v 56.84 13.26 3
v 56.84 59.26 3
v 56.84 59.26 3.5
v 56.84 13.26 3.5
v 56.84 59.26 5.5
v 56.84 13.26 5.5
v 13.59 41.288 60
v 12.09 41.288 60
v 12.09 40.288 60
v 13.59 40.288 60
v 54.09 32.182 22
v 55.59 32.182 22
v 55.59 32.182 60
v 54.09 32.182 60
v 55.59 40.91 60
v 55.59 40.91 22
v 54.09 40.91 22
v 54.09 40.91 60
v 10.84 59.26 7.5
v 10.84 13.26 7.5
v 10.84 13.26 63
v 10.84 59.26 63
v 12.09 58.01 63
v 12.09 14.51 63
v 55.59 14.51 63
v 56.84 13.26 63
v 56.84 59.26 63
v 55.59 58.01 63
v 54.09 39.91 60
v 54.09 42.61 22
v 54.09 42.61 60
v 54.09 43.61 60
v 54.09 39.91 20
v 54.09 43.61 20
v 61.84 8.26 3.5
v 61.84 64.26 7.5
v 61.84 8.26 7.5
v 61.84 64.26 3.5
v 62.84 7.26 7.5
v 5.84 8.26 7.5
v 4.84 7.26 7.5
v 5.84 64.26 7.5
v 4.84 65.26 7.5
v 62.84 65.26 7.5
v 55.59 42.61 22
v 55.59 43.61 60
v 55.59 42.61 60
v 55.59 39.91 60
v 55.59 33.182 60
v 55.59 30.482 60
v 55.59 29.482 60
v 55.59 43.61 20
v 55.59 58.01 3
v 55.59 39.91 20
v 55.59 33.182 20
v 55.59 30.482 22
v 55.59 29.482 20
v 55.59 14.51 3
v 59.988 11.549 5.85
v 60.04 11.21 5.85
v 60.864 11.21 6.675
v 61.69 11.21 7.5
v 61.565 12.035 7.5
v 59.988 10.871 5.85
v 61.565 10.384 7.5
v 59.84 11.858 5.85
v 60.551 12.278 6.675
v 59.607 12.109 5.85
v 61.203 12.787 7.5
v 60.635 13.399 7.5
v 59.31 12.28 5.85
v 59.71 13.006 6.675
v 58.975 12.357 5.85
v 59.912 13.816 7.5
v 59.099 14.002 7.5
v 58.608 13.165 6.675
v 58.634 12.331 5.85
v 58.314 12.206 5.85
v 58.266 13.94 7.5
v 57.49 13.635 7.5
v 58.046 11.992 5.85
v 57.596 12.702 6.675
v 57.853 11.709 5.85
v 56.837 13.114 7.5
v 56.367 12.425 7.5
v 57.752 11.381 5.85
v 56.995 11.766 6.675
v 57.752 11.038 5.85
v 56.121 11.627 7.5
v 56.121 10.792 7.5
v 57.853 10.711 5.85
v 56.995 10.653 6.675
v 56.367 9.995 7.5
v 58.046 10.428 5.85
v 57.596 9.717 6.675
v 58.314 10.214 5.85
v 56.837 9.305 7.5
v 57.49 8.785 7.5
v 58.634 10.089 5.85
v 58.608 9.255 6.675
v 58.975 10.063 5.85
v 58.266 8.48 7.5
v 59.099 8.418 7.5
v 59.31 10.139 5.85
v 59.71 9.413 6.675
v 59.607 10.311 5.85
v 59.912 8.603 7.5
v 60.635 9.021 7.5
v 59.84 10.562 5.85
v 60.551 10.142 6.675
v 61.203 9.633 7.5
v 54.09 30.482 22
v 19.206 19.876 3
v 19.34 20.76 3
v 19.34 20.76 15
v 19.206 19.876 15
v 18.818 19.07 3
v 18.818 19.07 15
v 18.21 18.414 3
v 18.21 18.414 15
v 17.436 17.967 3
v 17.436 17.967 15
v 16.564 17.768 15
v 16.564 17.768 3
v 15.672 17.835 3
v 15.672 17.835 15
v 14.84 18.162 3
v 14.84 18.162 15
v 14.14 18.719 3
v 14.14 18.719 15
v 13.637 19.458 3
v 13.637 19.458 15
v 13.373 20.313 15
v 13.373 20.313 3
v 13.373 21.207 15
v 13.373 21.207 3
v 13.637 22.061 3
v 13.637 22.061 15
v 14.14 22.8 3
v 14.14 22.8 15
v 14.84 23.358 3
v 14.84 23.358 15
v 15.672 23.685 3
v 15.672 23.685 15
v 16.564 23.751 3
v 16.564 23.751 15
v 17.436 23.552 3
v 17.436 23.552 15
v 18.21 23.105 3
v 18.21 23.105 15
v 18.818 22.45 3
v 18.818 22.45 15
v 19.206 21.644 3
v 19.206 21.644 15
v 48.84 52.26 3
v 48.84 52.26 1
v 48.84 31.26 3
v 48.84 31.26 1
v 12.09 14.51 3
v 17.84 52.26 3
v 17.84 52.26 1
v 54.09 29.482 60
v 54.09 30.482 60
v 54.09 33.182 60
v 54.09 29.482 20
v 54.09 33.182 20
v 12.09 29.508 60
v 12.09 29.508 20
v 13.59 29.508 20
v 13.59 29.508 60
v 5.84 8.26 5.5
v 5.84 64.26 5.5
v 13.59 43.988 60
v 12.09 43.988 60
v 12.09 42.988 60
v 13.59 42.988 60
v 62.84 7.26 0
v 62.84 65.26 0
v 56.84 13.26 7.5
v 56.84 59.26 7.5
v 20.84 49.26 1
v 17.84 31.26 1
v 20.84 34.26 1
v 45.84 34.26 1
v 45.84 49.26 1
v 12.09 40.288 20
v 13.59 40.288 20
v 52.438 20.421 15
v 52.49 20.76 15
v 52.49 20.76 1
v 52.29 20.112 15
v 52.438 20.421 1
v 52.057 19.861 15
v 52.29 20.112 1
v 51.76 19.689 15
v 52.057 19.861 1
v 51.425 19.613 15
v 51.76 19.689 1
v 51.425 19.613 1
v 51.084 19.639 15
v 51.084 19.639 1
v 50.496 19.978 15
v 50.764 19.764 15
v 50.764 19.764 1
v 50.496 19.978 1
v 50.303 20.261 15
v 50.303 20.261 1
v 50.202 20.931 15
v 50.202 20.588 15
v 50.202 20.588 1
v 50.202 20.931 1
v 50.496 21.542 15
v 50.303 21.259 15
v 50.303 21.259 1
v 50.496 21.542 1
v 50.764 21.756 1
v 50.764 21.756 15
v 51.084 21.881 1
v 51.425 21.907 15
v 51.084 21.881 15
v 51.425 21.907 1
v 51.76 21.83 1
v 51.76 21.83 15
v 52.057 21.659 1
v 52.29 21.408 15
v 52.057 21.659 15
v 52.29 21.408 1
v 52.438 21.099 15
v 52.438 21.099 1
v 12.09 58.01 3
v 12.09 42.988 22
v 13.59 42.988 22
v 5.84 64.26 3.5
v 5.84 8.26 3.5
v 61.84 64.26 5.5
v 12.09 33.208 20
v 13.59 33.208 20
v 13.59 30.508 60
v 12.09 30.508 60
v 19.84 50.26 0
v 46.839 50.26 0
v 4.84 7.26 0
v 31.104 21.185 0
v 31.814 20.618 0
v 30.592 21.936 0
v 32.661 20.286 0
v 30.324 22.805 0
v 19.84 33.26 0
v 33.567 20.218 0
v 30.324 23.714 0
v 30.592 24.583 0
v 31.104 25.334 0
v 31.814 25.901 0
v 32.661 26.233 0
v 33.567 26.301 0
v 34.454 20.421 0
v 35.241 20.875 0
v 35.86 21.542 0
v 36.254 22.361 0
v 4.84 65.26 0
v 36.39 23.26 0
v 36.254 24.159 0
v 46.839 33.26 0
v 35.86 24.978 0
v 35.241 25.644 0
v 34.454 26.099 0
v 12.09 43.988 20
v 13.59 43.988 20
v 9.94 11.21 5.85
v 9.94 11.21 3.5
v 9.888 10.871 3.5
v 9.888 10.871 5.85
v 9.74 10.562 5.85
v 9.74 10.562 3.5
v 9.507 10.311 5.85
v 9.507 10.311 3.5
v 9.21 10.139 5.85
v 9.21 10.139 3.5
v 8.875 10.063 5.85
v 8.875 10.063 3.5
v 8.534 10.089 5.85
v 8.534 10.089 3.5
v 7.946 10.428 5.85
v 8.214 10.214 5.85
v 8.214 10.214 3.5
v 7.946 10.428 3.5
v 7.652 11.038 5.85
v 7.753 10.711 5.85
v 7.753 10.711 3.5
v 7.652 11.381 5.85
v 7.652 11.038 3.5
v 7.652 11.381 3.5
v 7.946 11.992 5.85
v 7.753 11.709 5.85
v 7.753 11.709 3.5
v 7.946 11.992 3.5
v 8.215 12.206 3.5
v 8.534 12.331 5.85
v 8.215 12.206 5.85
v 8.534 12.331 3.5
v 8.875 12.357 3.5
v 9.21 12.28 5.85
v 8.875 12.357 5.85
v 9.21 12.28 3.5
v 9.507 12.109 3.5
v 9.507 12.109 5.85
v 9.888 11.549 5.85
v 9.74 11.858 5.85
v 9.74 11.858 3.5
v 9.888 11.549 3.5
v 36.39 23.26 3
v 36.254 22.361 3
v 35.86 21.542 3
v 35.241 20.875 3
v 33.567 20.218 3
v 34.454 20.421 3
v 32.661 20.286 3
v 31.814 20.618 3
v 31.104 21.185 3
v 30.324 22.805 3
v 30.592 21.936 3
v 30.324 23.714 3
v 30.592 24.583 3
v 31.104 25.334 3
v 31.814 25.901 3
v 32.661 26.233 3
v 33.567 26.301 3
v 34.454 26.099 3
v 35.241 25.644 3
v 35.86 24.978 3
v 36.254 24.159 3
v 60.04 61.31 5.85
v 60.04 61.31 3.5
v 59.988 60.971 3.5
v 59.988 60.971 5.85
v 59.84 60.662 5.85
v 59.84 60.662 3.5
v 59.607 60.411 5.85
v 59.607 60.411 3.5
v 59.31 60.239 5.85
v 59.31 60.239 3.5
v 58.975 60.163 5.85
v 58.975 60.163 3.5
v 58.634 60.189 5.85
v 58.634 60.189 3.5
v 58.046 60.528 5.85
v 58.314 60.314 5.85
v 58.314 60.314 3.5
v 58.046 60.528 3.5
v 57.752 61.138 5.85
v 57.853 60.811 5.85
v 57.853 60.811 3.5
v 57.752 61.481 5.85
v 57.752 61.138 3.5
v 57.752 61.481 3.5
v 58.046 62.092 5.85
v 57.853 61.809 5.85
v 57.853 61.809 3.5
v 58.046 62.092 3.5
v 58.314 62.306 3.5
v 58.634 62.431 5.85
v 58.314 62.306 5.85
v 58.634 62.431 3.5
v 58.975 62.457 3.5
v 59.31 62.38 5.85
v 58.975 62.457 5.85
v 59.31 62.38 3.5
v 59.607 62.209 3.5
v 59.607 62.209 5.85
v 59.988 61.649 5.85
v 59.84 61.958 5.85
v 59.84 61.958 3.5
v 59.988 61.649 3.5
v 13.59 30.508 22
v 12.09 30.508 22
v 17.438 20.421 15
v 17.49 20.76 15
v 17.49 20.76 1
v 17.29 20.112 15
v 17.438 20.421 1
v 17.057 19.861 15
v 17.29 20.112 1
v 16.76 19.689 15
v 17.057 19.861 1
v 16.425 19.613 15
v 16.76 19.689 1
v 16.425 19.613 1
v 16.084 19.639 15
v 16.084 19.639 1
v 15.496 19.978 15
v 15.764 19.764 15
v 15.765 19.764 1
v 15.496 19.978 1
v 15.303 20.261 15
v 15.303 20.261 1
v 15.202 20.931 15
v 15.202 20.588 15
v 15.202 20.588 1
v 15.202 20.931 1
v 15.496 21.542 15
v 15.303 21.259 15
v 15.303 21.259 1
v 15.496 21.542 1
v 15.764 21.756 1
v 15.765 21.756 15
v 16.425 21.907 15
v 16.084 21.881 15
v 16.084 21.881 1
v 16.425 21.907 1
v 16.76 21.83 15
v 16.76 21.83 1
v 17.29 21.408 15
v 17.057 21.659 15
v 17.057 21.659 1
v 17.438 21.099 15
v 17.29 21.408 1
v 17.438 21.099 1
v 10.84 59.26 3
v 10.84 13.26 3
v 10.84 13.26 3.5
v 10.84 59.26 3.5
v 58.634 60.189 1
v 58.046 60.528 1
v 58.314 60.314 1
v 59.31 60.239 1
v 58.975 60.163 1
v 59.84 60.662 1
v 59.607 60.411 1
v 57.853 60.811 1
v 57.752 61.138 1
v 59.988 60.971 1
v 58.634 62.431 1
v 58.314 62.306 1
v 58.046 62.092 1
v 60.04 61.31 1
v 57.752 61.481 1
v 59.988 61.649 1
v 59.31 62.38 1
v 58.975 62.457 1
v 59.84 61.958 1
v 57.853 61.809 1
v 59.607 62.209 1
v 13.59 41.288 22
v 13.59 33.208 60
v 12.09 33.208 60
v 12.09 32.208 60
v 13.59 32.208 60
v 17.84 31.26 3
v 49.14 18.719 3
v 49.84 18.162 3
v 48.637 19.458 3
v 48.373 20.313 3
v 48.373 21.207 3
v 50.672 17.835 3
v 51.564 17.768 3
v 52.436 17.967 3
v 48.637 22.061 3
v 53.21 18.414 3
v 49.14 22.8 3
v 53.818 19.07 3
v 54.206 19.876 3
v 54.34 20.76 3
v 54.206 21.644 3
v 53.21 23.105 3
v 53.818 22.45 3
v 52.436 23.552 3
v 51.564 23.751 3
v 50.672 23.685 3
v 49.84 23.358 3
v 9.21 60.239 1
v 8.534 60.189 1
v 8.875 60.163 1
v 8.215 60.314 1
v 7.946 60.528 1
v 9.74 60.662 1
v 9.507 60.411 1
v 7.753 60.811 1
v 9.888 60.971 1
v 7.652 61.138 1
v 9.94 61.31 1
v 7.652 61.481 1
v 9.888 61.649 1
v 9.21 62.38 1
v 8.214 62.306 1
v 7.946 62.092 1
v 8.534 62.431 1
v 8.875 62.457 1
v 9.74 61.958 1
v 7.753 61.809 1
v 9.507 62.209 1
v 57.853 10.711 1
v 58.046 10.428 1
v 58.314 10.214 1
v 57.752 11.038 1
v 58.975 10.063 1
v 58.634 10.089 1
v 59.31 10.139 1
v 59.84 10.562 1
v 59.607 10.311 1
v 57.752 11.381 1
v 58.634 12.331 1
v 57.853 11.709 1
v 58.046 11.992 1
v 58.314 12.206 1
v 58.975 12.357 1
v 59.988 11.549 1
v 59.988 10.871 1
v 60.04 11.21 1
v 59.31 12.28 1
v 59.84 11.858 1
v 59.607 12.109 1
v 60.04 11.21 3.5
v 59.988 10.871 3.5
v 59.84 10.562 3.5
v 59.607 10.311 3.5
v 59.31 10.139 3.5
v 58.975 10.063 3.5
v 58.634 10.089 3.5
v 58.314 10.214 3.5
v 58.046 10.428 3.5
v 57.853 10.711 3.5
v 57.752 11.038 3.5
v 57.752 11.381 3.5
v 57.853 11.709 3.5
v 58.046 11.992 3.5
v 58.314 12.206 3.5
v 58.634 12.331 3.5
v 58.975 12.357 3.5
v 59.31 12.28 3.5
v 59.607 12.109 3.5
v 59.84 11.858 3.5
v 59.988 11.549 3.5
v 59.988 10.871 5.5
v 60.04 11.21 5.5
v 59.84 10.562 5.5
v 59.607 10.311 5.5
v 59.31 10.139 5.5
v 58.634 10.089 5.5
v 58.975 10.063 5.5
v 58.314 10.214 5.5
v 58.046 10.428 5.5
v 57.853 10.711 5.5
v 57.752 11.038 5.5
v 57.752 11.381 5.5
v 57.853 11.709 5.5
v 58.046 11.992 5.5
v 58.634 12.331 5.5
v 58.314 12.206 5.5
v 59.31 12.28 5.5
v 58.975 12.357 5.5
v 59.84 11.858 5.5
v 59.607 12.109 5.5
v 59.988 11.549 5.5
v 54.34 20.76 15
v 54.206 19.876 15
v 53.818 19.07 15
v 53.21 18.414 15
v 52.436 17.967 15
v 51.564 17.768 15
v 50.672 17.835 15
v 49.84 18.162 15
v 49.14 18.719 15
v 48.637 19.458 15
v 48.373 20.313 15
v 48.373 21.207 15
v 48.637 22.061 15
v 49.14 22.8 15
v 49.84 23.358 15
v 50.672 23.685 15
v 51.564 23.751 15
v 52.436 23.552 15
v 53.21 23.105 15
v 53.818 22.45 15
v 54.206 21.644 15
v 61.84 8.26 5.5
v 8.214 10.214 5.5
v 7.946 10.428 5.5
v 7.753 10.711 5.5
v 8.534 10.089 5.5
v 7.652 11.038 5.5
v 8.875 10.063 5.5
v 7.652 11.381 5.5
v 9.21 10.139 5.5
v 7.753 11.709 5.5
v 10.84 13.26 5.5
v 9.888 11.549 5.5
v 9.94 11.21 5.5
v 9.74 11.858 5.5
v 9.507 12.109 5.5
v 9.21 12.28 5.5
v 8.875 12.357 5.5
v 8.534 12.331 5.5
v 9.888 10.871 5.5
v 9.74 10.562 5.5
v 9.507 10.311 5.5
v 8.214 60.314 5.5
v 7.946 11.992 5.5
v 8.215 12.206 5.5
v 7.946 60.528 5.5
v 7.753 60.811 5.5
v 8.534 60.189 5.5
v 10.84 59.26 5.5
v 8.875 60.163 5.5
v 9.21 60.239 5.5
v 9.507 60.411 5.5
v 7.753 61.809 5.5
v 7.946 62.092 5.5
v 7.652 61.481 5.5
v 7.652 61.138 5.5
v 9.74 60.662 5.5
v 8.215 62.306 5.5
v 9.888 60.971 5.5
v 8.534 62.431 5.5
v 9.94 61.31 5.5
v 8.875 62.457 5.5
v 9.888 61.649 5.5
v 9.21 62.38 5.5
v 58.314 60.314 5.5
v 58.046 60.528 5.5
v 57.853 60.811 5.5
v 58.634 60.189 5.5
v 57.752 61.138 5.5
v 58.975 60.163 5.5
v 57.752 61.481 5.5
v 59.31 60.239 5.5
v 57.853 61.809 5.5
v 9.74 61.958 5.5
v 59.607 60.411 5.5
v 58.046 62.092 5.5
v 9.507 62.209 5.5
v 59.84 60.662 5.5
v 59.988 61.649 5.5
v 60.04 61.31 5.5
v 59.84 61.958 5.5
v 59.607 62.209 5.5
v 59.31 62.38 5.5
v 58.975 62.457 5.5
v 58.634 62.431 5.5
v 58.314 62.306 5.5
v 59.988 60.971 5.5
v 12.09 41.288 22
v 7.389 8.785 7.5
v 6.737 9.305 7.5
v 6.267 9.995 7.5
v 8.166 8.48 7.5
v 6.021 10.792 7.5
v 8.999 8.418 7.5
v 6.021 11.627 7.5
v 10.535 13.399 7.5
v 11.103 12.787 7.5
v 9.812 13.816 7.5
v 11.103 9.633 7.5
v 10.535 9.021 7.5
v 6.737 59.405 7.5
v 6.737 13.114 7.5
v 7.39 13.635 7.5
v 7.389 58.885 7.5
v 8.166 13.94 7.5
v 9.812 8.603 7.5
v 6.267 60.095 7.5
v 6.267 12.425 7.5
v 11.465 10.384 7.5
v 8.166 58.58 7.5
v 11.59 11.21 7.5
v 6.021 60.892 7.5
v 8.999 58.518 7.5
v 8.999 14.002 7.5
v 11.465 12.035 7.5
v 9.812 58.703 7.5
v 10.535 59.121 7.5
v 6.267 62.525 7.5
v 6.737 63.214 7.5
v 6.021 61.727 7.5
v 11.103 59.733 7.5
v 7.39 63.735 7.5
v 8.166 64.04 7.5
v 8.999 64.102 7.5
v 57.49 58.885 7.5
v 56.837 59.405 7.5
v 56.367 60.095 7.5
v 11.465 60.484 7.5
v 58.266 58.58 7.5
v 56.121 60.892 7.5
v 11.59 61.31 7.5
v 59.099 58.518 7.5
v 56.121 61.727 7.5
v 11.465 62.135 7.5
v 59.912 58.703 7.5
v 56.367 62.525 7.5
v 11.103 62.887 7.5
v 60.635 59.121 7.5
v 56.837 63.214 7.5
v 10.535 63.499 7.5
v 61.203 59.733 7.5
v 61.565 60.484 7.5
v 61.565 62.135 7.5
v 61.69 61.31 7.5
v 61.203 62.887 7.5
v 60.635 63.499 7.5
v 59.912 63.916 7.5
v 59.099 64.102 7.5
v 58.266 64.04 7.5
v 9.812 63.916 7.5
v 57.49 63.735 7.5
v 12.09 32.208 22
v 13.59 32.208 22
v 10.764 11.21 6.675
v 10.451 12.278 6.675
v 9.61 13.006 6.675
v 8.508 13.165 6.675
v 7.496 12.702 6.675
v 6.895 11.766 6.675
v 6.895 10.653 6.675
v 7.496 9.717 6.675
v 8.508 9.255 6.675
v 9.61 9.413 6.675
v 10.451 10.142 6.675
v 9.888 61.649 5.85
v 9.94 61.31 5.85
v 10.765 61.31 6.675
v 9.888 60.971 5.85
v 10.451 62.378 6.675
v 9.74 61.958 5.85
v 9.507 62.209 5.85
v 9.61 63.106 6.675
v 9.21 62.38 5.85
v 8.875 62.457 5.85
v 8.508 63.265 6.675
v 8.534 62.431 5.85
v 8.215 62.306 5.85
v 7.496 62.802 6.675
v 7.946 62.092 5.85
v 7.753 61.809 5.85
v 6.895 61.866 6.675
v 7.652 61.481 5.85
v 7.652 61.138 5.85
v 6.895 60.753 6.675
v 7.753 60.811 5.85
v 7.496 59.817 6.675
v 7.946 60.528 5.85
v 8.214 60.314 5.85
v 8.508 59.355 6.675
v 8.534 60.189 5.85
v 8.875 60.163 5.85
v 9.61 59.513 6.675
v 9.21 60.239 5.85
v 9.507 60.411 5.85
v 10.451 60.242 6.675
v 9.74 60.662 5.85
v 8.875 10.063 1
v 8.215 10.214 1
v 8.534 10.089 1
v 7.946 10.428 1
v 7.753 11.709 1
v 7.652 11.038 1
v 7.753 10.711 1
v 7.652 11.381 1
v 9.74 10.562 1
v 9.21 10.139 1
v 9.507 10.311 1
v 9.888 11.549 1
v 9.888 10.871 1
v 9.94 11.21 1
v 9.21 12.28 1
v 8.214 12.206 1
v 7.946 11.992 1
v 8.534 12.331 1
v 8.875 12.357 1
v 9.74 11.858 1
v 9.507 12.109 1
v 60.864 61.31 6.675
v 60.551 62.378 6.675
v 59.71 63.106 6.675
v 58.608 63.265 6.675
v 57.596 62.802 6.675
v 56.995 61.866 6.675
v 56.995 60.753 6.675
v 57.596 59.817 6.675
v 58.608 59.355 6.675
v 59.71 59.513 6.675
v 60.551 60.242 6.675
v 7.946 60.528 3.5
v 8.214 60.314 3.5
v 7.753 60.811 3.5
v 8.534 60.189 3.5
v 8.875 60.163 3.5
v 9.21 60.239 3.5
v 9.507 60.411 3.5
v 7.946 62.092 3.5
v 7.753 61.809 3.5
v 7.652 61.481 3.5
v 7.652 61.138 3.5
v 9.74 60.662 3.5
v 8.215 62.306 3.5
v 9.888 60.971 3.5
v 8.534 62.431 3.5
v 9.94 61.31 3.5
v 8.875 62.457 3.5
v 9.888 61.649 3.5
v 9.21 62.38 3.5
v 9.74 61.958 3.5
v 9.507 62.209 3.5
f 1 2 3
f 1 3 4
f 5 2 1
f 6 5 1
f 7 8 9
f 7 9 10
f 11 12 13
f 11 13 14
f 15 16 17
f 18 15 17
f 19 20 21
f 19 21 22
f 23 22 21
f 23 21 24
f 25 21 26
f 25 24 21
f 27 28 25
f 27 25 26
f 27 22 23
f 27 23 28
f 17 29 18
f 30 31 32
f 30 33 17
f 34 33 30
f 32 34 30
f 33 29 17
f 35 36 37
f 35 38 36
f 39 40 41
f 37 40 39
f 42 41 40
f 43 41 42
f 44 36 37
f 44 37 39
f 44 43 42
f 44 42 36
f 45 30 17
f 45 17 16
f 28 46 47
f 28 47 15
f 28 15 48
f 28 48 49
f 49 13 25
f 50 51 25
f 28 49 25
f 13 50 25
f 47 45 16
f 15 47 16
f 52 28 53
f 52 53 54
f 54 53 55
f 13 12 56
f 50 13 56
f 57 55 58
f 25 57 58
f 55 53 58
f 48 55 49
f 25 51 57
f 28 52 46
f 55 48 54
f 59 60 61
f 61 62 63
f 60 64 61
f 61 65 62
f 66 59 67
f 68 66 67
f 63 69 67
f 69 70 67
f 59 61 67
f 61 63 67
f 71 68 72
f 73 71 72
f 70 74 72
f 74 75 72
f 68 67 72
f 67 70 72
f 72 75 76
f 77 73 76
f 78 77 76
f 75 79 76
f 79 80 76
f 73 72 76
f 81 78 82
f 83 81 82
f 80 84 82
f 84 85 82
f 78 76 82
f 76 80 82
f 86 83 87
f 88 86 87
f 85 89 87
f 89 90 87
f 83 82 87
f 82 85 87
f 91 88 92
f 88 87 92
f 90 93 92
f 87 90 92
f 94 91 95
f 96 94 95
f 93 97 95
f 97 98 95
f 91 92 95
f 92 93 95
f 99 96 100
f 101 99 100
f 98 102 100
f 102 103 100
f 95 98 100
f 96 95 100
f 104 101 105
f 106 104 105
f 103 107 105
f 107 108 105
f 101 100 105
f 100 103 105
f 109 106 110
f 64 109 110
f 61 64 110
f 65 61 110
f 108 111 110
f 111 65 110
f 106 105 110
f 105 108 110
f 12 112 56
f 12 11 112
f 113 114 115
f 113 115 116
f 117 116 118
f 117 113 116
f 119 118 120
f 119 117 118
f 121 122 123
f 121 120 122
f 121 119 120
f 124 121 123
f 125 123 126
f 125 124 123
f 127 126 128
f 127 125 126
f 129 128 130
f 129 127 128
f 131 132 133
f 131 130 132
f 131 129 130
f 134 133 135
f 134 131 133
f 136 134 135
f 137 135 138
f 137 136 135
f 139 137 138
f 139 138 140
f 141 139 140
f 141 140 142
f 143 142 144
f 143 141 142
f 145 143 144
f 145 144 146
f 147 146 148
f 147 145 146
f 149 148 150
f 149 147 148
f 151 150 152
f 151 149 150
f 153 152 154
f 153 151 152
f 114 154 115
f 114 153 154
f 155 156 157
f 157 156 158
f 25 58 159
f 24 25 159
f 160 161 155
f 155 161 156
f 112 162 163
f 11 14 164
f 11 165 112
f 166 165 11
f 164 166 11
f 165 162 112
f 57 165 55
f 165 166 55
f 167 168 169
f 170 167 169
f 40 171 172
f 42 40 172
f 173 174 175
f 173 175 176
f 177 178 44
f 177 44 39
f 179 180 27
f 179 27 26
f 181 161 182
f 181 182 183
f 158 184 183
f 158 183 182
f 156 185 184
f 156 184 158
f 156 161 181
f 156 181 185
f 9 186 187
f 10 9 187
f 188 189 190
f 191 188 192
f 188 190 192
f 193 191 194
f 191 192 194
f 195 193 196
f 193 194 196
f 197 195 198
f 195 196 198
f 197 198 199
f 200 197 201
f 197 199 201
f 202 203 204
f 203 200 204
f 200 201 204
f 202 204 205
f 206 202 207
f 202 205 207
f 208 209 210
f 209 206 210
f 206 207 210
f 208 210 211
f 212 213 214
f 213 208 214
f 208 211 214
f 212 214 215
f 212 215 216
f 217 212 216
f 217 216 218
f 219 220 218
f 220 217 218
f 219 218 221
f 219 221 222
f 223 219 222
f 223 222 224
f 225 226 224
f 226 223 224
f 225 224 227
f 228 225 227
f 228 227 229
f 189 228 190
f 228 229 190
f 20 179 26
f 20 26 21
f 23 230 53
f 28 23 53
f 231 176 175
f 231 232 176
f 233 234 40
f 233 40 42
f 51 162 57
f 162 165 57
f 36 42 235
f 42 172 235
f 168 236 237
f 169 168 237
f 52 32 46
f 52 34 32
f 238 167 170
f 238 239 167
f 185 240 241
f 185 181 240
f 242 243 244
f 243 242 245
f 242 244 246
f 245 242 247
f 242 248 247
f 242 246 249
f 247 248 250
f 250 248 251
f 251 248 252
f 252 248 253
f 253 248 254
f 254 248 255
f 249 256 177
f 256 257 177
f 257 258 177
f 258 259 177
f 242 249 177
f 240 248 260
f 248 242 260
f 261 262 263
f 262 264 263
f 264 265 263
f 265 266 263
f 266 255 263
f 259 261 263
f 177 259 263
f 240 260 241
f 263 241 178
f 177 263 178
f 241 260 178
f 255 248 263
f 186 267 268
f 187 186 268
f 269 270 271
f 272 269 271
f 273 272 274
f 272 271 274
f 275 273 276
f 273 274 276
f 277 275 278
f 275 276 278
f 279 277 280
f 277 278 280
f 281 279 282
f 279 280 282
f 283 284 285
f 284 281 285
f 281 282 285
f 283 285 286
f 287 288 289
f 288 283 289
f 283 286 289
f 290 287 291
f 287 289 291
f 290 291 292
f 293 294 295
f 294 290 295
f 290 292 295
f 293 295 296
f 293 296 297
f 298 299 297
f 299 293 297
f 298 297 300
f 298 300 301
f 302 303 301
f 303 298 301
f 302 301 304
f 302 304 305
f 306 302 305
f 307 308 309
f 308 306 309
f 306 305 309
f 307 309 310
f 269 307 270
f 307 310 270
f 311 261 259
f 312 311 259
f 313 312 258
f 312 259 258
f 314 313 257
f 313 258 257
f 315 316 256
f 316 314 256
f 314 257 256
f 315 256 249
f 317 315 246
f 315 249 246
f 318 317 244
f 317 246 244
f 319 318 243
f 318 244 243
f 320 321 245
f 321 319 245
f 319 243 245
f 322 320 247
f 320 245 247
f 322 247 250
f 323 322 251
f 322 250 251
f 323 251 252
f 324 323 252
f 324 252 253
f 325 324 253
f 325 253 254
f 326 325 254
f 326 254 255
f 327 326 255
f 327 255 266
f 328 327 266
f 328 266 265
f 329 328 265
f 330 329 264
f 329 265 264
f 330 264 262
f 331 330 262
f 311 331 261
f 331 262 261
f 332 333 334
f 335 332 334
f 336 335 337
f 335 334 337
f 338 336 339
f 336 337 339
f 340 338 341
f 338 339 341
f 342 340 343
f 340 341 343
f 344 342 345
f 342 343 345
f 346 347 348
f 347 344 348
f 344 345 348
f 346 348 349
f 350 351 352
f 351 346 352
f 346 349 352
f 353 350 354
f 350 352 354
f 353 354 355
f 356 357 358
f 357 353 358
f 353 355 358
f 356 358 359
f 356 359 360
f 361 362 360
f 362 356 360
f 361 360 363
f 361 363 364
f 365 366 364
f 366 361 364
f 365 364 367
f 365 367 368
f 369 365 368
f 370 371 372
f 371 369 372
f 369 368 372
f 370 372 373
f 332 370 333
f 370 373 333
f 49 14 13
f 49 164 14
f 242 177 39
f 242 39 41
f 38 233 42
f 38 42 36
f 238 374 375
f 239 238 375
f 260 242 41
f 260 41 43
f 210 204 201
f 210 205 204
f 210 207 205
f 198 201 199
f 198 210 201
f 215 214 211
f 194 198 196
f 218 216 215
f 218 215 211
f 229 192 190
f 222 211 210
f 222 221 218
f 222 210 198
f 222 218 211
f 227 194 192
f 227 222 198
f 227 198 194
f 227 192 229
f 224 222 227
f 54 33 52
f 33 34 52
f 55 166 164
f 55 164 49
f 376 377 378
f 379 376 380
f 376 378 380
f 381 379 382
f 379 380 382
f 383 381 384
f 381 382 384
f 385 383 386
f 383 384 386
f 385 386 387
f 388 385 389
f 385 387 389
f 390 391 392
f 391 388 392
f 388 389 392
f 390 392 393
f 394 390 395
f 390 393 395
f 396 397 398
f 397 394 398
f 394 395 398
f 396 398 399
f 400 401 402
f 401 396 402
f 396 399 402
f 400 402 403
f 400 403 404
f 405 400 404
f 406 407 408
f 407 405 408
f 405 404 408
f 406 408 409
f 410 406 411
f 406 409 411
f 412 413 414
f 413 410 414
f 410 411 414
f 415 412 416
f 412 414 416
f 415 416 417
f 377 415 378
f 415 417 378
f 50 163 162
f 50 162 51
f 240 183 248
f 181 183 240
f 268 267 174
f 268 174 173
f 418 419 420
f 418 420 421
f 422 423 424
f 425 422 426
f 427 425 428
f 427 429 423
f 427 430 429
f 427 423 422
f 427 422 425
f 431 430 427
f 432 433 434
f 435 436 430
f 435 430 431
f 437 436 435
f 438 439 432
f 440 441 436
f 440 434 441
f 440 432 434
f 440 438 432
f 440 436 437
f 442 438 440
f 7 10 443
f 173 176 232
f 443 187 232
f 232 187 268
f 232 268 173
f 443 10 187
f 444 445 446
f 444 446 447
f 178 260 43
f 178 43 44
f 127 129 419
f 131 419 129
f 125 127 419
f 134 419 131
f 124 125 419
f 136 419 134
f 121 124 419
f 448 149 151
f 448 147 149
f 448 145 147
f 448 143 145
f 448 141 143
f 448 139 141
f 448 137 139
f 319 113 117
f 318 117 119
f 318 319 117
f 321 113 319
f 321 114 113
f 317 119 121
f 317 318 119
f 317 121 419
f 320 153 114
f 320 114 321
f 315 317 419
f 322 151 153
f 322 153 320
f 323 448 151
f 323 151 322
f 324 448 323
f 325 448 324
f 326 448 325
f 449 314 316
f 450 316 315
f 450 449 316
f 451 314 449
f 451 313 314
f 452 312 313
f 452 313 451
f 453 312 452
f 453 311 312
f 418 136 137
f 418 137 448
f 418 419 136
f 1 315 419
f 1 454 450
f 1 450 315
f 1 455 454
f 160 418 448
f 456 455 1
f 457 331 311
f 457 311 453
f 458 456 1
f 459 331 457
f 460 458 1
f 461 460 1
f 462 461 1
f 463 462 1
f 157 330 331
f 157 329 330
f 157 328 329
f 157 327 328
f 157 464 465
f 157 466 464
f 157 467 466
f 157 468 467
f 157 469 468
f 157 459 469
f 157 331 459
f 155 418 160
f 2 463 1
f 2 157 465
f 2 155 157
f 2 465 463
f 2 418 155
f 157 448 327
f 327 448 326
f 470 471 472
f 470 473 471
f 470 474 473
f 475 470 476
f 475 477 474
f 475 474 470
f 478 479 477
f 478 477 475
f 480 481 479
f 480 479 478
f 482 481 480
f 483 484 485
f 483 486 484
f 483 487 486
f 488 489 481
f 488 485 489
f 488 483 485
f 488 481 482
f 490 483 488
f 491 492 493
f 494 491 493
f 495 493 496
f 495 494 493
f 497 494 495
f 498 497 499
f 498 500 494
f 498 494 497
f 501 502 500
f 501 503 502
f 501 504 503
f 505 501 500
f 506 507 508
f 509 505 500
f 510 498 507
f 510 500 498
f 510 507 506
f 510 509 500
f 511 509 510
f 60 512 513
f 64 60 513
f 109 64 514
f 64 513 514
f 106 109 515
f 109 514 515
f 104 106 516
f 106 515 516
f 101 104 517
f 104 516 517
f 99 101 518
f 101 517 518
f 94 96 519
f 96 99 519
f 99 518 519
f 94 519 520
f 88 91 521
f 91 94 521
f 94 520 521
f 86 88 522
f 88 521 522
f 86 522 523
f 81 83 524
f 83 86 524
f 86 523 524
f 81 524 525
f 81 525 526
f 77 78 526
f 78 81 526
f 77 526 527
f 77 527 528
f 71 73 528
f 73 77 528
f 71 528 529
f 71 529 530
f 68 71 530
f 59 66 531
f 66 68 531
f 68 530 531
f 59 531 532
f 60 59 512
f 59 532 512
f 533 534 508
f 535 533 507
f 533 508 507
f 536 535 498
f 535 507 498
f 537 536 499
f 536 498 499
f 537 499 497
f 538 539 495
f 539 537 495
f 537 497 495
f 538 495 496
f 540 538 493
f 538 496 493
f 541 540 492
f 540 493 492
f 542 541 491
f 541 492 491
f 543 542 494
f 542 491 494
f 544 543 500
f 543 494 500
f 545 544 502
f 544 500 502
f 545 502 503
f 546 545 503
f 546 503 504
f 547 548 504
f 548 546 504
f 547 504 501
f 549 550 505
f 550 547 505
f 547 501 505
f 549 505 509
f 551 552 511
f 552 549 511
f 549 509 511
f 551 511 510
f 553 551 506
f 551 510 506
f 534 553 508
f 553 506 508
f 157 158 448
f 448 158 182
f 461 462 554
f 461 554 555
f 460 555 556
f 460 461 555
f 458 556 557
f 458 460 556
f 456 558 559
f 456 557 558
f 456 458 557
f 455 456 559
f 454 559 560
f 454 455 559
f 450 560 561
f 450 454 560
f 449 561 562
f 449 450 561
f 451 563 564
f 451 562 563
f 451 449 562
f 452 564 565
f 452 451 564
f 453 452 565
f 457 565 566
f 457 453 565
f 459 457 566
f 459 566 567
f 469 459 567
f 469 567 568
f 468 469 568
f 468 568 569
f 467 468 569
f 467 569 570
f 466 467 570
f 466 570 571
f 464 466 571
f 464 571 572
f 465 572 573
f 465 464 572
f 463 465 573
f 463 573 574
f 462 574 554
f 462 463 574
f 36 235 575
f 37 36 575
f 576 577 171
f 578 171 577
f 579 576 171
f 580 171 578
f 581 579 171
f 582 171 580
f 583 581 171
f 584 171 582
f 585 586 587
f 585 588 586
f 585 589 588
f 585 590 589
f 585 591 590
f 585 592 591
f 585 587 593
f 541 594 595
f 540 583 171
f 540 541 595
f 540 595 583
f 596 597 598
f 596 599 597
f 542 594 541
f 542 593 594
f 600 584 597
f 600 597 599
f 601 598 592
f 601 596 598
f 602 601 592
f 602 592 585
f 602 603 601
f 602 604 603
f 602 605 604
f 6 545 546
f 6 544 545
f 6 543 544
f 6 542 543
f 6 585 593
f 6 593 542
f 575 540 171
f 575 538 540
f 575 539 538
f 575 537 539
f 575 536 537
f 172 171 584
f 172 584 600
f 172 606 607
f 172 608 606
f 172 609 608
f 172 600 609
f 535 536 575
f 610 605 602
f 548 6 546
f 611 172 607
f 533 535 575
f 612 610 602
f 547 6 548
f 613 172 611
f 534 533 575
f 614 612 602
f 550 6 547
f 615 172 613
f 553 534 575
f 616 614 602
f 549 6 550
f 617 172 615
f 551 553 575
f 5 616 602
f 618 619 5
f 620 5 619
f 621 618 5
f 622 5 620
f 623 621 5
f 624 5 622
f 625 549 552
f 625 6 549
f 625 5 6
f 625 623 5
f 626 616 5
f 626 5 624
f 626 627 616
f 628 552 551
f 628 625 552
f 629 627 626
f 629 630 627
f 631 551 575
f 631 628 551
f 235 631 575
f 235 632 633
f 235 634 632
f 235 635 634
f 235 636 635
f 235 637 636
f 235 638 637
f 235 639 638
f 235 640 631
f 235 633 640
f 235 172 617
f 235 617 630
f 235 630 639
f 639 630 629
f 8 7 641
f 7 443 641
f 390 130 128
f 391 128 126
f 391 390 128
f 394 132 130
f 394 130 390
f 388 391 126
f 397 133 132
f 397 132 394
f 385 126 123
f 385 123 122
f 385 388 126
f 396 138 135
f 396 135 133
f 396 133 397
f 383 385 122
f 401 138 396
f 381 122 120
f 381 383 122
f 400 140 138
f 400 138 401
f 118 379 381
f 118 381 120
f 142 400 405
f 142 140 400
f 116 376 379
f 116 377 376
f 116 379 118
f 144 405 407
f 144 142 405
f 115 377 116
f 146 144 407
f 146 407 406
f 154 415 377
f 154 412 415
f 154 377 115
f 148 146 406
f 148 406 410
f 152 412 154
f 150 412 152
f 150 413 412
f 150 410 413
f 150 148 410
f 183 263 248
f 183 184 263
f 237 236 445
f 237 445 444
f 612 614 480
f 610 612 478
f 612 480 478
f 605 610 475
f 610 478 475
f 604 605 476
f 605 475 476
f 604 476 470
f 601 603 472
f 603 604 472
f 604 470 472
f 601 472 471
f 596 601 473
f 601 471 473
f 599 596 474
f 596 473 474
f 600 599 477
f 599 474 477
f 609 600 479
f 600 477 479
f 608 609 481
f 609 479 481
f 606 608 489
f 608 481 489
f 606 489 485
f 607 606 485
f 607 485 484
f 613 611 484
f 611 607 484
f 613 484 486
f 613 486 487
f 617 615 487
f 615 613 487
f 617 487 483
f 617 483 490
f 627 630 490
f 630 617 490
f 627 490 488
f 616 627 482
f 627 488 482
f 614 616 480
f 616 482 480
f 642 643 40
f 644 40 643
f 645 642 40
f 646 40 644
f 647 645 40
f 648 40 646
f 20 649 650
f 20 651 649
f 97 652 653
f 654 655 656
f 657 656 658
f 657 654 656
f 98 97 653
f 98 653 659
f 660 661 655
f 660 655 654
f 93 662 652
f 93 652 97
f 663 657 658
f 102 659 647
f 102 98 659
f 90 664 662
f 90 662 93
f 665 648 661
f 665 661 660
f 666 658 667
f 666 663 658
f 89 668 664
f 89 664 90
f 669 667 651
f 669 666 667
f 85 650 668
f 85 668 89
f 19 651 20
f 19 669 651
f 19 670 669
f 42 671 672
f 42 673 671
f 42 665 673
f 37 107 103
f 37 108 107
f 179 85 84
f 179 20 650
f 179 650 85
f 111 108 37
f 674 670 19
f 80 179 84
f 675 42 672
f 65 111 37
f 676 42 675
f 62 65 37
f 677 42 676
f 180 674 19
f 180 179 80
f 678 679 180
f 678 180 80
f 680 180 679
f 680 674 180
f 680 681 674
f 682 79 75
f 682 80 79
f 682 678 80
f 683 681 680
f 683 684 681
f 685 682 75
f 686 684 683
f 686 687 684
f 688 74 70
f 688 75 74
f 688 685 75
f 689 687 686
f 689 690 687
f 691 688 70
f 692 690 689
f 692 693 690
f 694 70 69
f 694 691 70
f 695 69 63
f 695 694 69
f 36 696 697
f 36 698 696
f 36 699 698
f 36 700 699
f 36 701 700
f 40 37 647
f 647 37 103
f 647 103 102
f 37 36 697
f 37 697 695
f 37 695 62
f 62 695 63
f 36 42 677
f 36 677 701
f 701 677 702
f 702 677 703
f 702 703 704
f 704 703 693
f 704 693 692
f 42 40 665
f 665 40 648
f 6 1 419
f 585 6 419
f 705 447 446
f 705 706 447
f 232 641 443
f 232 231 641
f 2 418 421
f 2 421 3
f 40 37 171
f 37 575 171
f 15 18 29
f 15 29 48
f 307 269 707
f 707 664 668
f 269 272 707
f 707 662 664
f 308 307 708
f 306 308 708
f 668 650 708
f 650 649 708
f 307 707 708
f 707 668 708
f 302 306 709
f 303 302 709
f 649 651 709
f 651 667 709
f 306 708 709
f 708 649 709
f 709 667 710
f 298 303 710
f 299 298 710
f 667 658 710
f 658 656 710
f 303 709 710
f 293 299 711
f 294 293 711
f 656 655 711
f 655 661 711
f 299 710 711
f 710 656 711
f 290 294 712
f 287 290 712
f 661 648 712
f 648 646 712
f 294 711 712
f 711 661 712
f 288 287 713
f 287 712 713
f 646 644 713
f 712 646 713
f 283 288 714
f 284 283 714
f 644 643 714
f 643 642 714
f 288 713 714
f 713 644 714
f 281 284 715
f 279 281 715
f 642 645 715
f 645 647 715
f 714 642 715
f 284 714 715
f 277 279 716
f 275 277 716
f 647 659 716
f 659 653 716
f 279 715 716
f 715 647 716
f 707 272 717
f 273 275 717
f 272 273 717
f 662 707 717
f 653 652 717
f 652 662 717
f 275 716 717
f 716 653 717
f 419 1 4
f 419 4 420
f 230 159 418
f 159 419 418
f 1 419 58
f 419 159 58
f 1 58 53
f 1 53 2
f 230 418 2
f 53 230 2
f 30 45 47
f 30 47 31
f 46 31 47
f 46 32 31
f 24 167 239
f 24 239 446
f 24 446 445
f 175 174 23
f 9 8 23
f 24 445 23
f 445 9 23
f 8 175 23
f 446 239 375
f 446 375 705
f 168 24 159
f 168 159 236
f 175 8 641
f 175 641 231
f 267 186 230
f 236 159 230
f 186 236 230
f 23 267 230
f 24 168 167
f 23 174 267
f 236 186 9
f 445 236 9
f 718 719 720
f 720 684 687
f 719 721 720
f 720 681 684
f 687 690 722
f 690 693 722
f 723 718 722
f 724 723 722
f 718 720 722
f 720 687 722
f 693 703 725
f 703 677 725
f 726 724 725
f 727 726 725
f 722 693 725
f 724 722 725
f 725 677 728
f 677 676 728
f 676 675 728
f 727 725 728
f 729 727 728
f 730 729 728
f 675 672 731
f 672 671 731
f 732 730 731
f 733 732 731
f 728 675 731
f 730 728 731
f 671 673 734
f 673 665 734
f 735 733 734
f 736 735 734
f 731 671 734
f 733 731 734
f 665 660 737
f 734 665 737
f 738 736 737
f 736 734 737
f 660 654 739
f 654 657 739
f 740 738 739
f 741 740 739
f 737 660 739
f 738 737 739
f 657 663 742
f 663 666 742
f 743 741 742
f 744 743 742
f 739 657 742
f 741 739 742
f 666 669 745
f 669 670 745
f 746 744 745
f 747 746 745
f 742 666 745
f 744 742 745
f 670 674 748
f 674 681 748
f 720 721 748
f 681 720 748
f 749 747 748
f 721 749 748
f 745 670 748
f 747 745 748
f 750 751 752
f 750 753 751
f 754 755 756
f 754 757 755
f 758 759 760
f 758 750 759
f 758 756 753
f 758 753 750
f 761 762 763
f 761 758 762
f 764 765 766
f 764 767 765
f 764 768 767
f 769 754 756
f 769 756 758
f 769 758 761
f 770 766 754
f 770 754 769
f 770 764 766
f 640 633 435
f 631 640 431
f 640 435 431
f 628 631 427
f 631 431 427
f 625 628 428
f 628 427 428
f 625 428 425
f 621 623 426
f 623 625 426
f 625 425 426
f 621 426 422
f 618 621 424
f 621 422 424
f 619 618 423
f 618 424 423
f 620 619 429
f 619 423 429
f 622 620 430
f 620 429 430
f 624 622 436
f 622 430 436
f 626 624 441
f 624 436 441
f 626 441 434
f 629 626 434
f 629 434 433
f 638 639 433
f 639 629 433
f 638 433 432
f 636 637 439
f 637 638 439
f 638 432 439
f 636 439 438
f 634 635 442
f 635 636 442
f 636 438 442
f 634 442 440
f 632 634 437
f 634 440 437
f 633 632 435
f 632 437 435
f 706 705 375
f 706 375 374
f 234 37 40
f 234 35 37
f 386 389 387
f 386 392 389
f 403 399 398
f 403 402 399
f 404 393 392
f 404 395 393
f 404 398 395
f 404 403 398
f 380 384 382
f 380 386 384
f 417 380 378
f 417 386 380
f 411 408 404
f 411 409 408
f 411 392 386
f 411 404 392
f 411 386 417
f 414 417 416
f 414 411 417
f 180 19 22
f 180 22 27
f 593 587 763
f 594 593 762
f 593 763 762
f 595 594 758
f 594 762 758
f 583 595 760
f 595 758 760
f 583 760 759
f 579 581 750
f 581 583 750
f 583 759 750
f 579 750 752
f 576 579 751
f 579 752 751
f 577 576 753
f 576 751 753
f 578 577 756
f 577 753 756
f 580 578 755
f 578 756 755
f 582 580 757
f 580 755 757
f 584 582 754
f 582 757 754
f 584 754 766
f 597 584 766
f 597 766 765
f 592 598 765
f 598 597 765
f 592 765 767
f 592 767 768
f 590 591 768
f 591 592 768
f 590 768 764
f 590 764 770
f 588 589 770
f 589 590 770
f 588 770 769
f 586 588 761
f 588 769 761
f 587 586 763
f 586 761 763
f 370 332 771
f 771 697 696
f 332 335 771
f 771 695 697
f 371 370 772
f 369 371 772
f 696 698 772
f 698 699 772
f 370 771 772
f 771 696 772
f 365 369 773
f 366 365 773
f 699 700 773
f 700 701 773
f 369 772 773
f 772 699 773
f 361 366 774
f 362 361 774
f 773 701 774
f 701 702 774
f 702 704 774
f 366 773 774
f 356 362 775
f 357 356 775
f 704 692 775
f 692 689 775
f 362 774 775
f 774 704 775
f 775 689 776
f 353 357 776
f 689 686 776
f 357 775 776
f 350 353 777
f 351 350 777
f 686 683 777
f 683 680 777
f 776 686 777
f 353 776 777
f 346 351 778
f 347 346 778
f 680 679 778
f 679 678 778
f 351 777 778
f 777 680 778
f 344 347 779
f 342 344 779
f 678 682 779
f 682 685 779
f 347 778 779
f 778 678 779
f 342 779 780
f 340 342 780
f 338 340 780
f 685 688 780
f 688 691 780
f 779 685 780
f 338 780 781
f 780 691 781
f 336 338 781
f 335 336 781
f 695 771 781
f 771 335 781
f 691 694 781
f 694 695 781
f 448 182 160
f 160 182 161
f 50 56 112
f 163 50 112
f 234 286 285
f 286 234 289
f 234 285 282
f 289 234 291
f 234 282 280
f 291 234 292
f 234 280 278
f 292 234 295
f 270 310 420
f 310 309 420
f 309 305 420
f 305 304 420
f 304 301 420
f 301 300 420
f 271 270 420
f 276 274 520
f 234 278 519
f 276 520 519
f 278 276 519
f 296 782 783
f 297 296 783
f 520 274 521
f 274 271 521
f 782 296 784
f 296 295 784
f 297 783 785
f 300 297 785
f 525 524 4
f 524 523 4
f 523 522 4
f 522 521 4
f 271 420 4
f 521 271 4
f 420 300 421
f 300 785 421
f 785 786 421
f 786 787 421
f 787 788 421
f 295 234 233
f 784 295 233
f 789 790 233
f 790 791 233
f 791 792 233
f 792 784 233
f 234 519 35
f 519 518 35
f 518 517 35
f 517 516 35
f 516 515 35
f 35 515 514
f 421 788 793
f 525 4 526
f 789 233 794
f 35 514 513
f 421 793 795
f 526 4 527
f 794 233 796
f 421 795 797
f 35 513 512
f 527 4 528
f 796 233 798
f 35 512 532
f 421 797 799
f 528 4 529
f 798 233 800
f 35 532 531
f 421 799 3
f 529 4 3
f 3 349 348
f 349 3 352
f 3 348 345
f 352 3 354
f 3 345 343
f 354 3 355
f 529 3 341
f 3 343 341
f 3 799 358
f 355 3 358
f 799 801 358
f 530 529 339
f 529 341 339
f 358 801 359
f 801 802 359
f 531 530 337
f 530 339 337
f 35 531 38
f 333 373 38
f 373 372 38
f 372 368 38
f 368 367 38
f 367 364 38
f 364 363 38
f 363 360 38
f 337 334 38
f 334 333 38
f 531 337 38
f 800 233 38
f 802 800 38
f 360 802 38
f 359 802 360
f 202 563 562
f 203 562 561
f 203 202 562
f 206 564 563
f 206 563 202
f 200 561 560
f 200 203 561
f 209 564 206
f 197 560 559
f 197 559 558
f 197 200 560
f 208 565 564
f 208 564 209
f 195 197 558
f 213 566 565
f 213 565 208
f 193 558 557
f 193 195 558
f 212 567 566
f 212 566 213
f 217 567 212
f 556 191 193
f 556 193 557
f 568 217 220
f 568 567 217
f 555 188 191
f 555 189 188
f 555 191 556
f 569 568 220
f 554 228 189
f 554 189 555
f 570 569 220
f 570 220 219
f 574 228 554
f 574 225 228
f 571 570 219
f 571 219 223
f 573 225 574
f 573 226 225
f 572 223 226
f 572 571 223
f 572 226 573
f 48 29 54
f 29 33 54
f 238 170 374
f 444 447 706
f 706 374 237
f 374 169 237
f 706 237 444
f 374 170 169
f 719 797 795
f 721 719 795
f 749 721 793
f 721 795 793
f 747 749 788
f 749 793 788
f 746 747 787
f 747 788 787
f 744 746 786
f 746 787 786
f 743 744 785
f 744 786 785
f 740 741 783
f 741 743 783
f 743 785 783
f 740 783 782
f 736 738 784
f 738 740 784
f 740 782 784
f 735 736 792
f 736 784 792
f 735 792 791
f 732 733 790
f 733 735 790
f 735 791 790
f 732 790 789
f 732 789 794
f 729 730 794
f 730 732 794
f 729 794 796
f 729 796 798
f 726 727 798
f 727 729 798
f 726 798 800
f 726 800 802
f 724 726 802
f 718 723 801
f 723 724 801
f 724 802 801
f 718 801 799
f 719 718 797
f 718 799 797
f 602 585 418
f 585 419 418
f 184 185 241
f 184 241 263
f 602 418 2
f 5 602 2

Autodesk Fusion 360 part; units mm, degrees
sketch "Esquisse1" plane through (0, 0, 0) normal (0, 0, 1) x (1, 0, 0)
  line L0 (56.8395, 13.2598) -> (10.8395, 13.2598)
  line L1 (10.8395, 13.2598) -> (10.8395, 59.2598)
  line L2 (10.8395, 59.2598) -> (56.8395, 59.2598)
  line L3 (56.8395, 59.2598) -> (56.8395, 13.2598)
  line L4 (56.8395, 13.2598) -> (10.8395, 59.2598) construction
  line L5 (10.8395, 13.2598) -> (56.8395, 59.2598) construction
  line L6 (62.8395, 7.2598) -> (4.8395, 7.2598)
  line L7 (4.8395, 7.2598) -> (4.8395, 65.2598)
  line L8 (4.8395, 65.2598) -> (62.8395, 65.2598)
  line L9 (62.8395, 65.2598) -> (62.8395, 7.2598)
  line L10 (62.8395, 7.2598) -> (4.8395, 65.2598) construction
  line L11 (4.8395, 7.2598) -> (62.8395, 65.2598) construction
  line L12 (39.3395, 17.2598) -> (27.3395, 17.2598)
  line L13 (27.3395, 17.2598) -> (27.3395, 29.2598)
  line L14 (27.3395, 29.2598) -> (39.3395, 29.2598)
  line L15 (39.3395, 29.2598) -> (39.3395, 17.2598)
  line L16 (39.3395, 17.2598) -> (27.3395, 29.2598) construction
  line L17 (27.3395, 17.2598) -> (39.3395, 29.2598) construction
  circle A0 centre (33.3395, 23.2598) radius 3.05
  circle A1 centre (16.3395, 20.7598) radius 1.15
  circle A2 centre (51.3395, 20.7598) radius 1.15
  line L18 (45.8395, 34.2598) -> (20.8395, 34.2598)
  line L19 (20.8395, 34.2598) -> (20.8395, 49.2598)
  line L20 (20.8395, 49.2598) -> (45.8395, 49.2598)
  line L21 (45.8395, 49.2598) -> (45.8395, 34.2598)
  line L22 (45.8395, 34.2598) -> (20.8395, 49.2598) construction
  line L23 (20.8395, 34.2598) -> (45.8395, 49.2598) construction
  line L24 (55.3395, 14.7598) -> (12.3395, 14.7598)
  line L25 (12.3395, 14.7598) -> (12.3395, 57.7598)
  line L26 (12.3395, 57.7598) -> (55.3395, 57.7598)
  line L27 (55.3395, 57.7598) -> (55.3395, 14.7598)
  line L28 (55.3395, 14.7598) -> (12.3395, 57.7598) construction
  line L29 (12.3395, 14.7598) -> (55.3395, 57.7598) construction
  circle A3 centre (8.7895, 61.3098) radius 1.15
  circle A4 centre (16.3395, 20.7598) radius 3
  line L30 (61.8395, 8.2598) -> (5.8395, 8.2598)
  line L31 (5.8395, 8.2598) -> (5.8395, 64.2598)
  line L32 (5.8395, 64.2598) -> (61.8395, 64.2598)
  line L33 (61.8395, 64.2598) -> (61.8395, 8.2598)
  line L34 (61.8395, 8.2598) -> (5.8395, 64.2598) construction
  line L35 (5.8395, 8.2598) -> (61.8395, 64.2598) construction
  circle A5 centre (51.3395, 20.7598) radius 3
  circle A6 centre (8.7895, 11.2098) radius 1.15
  circle A7 centre (58.8895, 11.2098) radius 1.15
  circle A8 centre (58.8895, 61.3098) radius 1.15
  line L36 (55.5895, 14.5098) -> (12.0895, 14.5098)
  line L37 (12.0895, 14.5098) -> (12.0895, 58.0098)
  line L38 (12.0895, 58.0098) -> (55.5895, 58.0098)
  line L39 (55.5895, 58.0098) -> (55.5895, 14.5098)
  line L40 (55.5895, 14.5098) -> (12.0895, 58.0098) construction
  line L41 (12.0895, 14.5098) -> (55.5895, 58.0098) construction
  line L42 (55.5895, 40.9098) -> (54.0895, 40.9098)
  line L43 (54.0895, 40.9098) -> (54.0895, 39.9098)
  line L44 (54.0895, 39.9098) -> (55.5895, 39.9098)
  line L45 (55.5895, 39.9098) -> (55.5895, 40.9098)
  line L46 (55.5895, 42.6098) -> (54.0895, 42.6098)
  line L47 (54.0895, 42.6098) -> (54.0895, 43.6098)
  line L48 (54.0895, 43.6098) -> (55.5895, 43.6098)
  line L49 (55.5895, 43.6098) -> (55.5895, 42.6098)
  line L50 (55.5895, 32.1824) -> (54.0895, 32.1824)
  line L51 (54.0895, 30.4824) -> (54.0895, 29.4824)
  line L52 (55.5895, 30.4824) -> (54.0895, 30.4824)
  line L53 (54.0895, 32.1824) -> (54.0895, 33.1824)
  line L54 (55.5895, 29.4824) -> (55.5895, 30.4824)
  line L55 (54.0895, 29.4824) -> (55.5895, 29.4824)
  line L56 (54.0895, 33.1824) -> (55.5895, 33.1824)
  line L57 (55.5895, 33.1824) -> (55.5895, 32.1824)
  line L58 (13.5895, 30.5078) -> (12.0895, 30.5078)
  line L59 (12.0895, 30.5078) -> (12.0895, 29.5078)
  line L60 (13.5895, 33.2078) -> (13.5895, 32.2078)
  line L61 (12.0895, 29.5078) -> (13.5895, 29.5078)
  line L62 (13.5895, 32.2078) -> (12.0895, 32.2078)
  line L63 (13.5895, 29.5078) -> (13.5895, 30.5078)
  line L64 (12.0895, 32.2078) -> (12.0895, 33.2078)
  line L65 (12.0895, 33.2078) -> (13.5895, 33.2078)
  line L66 (12.0895, 40.2881) -> (13.5895, 40.2881)
  line L67 (12.0895, 41.2881) -> (12.0895, 40.2881)
  line L68 (12.0895, 43.9881) -> (13.5895, 43.9881)
  line L69 (13.5895, 43.9881) -> (13.5895, 42.9881)
  line L70 (13.5895, 42.9881) -> (12.0895, 42.9881)
  line L71 (13.5895, 40.2881) -> (13.5895, 41.2881)
  line L72 (12.0895, 42.9881) -> (12.0895, 43.9881)
  line L73 (13.5895, 41.2881) -> (12.0895, 41.2881)
  line L74 (54.0895, 32.1824) -> (54.0895, 30.4824)
  line L75 (54.0895, 42.6098) -> (54.0895, 40.9098)
  line L76 (13.5895, 42.9881) -> (13.5895, 41.2881)
  line L77 (13.5895, 32.2078) -> (13.5895, 30.5078)
  line L78 (48.8395, 31.2598) -> (17.8395, 31.2598)
  line L79 (17.8395, 31.2598) -> (17.8395, 52.2598)
  line L80 (17.8395, 52.2598) -> (48.8395, 52.2598)
  line L81 (48.8395, 52.2598) -> (48.8395, 31.2598)
  line L82 (48.8395, 31.2598) -> (17.8395, 52.2598) construction
  line L83 (17.8395, 31.2598) -> (48.8395, 52.2598) construction
  point P0 (33.8395, 36.2598)
  point P1 (33.8395, 36.2598)
  point P2 (33.3395, 23.2598)
  point P3 (33.3395, 41.7598)
  point P4 (33.8395, 36.2598)
  point P5 (33.8395, 36.2598)
  point P6 (33.3395, 41.7598)
  point P7 (33.8395, 36.2598)
  point P8 (33.3395, 41.7598)
  dimension "d2" = 46
  dimension "d10" = 12
  dimension "d11" = 12
  dimension "d12" = 6.1
  dimension "d20" = 2.3
  dimension "d21" = 2.3
  dimension "d23" = 25
  dimension "d24" = 15
  dimension "d36" = 2.3
  dimension "d39" = 6
  dimension "d70" = 2.95
  dimension "d71" = 2.95
  dimension "d80" = 6
  dimension "d84" = 5
  dimension "d86" = 1
  dimension "d87" = 4
  dimension "d92" = 4
  dimension "d95" = 2.3
  dimension "d96" = 2.95
  dimension "d97" = 2.95
  dimension "d98" = 2.3
  dimension "d99" = 2.95
  dimension "d100" = 2.95
  dimension "d101" = 2.3
  dimension "d102" = 2.95
  dimension "d103" = 2.95
  dimension "d109" = 5
  dimension "d110" = 1
  dimension "d111" = 46
  dimension "d112" = 21
  dimension "d114" = 1.25
  dimension "d115" = 0.25
  dimension "d116" = 0.25
  dimension "d117" = 1.25
  dimension "d141" = 1.5
  dimension "d142" = 1
  dimension "d143" = 1.5
  dimension "d144" = 1
  dimension "d145" = 1.7
  dimension "d150" = 21
  dimension "d151" = 6
  dimension "d152" = 16
  dimension "d153" = 6
  dimension "d154" = 15.15
  dimension "d155" = 1.5
  dimension "d156" = 1
  dimension "d157" = 1.5
  dimension "d158" = 1
  dimension "d159" = 1.7
  dimension "d160" = 1.5
  dimension "d161" = 1
  dimension "d162" = 1.5
  dimension "d163" = 1
  dimension "d164" = 1.7
  dimension "d165" = 1.5
  dimension "d166" = 1
  dimension "d167" = 1.5
  dimension "d168" = 1
  dimension "d169" = 1.7
  dimension "d177" = 3
  dimension "d178" = 3
  dimension "d179" = 8.5
extrude "Extrusion8" add sketch "Esquisse1" along normal blind 1 contours L0 L1 L2 L3 | L12 L13 L14 L15 | A1 | A2 | L24 L25 L27 L36 L37 L39 L55 L61 | L24 L25 L26 L27 L43 L44 L47 L48 L51 L53 L55 L56 L60 L61 L63 L65 L66 L68 L69 L71 L74 L75 L76 L77 | L27 L51 L52 L55 | L27 L39 L52 L54 L55 | L25 L37 L58 L59 L61 | L25 L58 L61 L63 | L27 L50 L52 L74 | L27 L39 L50 L52 | L25 L37 L58 L62 | L25 L58 L62 L77 | L27 L50 L53 L56 | L27 L39 L50 L56 L57 | L25 L37 L62 L64 L65 | L25 L60 L62 L65 | L27 L39 L44 L56 | L25 L37 L65 L66 | L27 L42 L43 L44 | L27 L39 L42 L44 L45 | L25 L37 L66 L67 L73 | L25 L66 L71 L73 | L27 L42 L46 L75 | L27 L39 L42 L46 | L25 L37 L70 L73 | L25 L70 L73 L76 | L27 L46 L47 L48 | L27 L39 L46 L48 L49 | L25 L37 L68 L70 L72 | L25 L68 L69 L70 | L25 L26 L27 L37 L38 L39 L48 L68 | A3 | A4 | L30 L31 L32 L33 | A5 | A6 | A7 | A8 | L78 L79 L80 L81 makes body 1
extrude "Extrusion26" add sketch "Esquisse1" along normal blind 7.5 contours L6 L7 L8 L9 bodies 1
extrude "Extrusion27" add sketch "Esquisse1" along normal blind 5.5 contours L30 L31 L32 L33 bodies 1
extrude "Extrusion29" add sketch "Esquisse1" along normal blind 3 contours L0 L1 L2 L3 | L12 L13 L14 L15 | L24 L25 L27 L36 L37 L39 L55 L61 | L24 L25 L26 L27 L43 L44 L47 L48 L51 L53 L55 L56 L60 L61 L63 L65 L66 L68 L69 L71 L74 L75 L76 L77 | L27 L51 L52 L55 | L27 L39 L52 L54 L55 | L25 L37 L58 L59 L61 | L25 L58 L61 L63 | L27 L50 L52 L74 | L27 L39 L50 L52 | L25 L37 L58 L62 | L25 L58 L62 L77 | L27 L50 L53 L56 | L27 L39 L50 L56 L57 | L25 L37 L62 L64 L65 | L25 L60 L62 L65 | L27 L39 L44 L56 | L25 L37 L65 L66 | L27 L42 L43 L44 | L27 L39 L42 L44 L45 | L25 L37 L66 L67 L73 | L25 L66 L71 L73 | L27 L42 L46 L75 | L27 L39 L42 L46 | L25 L37 L70 L73 | L25 L70 L73 L76 | L27 L46 L47 L48 | L27 L39 L46 L48 L49 | L25 L37 L68 L70 L72 | L25 L68 L69 L70 | L25 L26 L27 L37 L38 L39 L48 L68 bodies 1
extrude "Extrusion30" add sketch "Esquisse1" along normal blind 15 contours A4 | A5 bodies 1
extrude "Extrusion21" add sketch "Esquisse1" along normal blind 4 from surface at 3.5 separate body contours L30 L31 L32 L33 makes body 2
extrude "Extrusion22" add sketch "Esquisse1" along normal blind 60 from surface at 3 contours L0 L1 L2 L3 bodies 2
extrude "Extrusion24" add sketch "Esquisse1" along normal blind 40 from surface at 20 contours L27 L51 L52 L55 | L27 L39 L52 L54 L55 | L25 L37 L58 L59 L61 | L25 L58 L61 L63 | L27 L50 L53 L56 | L27 L39 L50 L56 L57 | L25 L37 L62 L64 L65 | L25 L60 L62 L65 | L27 L42 L43 L44 | L27 L39 L42 L44 L45 | L25 L37 L66 L67 L73 | L25 L66 L71 L73 | L27 L46 L47 L48 | L27 L39 L46 L48 L49 | L25 L37 L68 L70 L72 | L25 L68 L69 L70 bodies 2
extrude "Extrusion25" add sketch "Esquisse1" along normal blind 2 from surface at 20 contours L27 L50 L52 L74 | L27 L39 L50 L52 | L25 L37 L58 L62 | L25 L58 L62 L77 | L27 L42 L46 L75 | L27 L39 L42 L46 | L25 L37 L70 L73 | L25 L70 L73 L76 bodies 2
chamfer "Chanfrein4" distance 1.65 angle 45 4 edges at (7.7173, 61.7257, 7.5) (7.7173, 11.6257, 7.5) (57.8173, 61.7257, 7.5) (57.8173, 11.6257, 7.5) on bodies 2
chamfer "Chanfrein5" distance 1 angle 45 4 edges at (33.3395, 49.2598, 0) (45.8395, 41.7598, 0) (33.3395, 34.2598, 0) (20.8395, 41.7598, 0) on bodies 1
equation "d20 = diam_autotaraudage"
equation "d21 = diam_autotaraudage"
equation "d36 = diam_autotaraudage"
equation "d95 = diam_autotaraudage"
equation "d98 = diam_autotaraudage"
equation "d101 = diam_autotaraudage"
equation "hauteur = 48 mm"
equation "diam_autotaraudage = 2.3 mm"
